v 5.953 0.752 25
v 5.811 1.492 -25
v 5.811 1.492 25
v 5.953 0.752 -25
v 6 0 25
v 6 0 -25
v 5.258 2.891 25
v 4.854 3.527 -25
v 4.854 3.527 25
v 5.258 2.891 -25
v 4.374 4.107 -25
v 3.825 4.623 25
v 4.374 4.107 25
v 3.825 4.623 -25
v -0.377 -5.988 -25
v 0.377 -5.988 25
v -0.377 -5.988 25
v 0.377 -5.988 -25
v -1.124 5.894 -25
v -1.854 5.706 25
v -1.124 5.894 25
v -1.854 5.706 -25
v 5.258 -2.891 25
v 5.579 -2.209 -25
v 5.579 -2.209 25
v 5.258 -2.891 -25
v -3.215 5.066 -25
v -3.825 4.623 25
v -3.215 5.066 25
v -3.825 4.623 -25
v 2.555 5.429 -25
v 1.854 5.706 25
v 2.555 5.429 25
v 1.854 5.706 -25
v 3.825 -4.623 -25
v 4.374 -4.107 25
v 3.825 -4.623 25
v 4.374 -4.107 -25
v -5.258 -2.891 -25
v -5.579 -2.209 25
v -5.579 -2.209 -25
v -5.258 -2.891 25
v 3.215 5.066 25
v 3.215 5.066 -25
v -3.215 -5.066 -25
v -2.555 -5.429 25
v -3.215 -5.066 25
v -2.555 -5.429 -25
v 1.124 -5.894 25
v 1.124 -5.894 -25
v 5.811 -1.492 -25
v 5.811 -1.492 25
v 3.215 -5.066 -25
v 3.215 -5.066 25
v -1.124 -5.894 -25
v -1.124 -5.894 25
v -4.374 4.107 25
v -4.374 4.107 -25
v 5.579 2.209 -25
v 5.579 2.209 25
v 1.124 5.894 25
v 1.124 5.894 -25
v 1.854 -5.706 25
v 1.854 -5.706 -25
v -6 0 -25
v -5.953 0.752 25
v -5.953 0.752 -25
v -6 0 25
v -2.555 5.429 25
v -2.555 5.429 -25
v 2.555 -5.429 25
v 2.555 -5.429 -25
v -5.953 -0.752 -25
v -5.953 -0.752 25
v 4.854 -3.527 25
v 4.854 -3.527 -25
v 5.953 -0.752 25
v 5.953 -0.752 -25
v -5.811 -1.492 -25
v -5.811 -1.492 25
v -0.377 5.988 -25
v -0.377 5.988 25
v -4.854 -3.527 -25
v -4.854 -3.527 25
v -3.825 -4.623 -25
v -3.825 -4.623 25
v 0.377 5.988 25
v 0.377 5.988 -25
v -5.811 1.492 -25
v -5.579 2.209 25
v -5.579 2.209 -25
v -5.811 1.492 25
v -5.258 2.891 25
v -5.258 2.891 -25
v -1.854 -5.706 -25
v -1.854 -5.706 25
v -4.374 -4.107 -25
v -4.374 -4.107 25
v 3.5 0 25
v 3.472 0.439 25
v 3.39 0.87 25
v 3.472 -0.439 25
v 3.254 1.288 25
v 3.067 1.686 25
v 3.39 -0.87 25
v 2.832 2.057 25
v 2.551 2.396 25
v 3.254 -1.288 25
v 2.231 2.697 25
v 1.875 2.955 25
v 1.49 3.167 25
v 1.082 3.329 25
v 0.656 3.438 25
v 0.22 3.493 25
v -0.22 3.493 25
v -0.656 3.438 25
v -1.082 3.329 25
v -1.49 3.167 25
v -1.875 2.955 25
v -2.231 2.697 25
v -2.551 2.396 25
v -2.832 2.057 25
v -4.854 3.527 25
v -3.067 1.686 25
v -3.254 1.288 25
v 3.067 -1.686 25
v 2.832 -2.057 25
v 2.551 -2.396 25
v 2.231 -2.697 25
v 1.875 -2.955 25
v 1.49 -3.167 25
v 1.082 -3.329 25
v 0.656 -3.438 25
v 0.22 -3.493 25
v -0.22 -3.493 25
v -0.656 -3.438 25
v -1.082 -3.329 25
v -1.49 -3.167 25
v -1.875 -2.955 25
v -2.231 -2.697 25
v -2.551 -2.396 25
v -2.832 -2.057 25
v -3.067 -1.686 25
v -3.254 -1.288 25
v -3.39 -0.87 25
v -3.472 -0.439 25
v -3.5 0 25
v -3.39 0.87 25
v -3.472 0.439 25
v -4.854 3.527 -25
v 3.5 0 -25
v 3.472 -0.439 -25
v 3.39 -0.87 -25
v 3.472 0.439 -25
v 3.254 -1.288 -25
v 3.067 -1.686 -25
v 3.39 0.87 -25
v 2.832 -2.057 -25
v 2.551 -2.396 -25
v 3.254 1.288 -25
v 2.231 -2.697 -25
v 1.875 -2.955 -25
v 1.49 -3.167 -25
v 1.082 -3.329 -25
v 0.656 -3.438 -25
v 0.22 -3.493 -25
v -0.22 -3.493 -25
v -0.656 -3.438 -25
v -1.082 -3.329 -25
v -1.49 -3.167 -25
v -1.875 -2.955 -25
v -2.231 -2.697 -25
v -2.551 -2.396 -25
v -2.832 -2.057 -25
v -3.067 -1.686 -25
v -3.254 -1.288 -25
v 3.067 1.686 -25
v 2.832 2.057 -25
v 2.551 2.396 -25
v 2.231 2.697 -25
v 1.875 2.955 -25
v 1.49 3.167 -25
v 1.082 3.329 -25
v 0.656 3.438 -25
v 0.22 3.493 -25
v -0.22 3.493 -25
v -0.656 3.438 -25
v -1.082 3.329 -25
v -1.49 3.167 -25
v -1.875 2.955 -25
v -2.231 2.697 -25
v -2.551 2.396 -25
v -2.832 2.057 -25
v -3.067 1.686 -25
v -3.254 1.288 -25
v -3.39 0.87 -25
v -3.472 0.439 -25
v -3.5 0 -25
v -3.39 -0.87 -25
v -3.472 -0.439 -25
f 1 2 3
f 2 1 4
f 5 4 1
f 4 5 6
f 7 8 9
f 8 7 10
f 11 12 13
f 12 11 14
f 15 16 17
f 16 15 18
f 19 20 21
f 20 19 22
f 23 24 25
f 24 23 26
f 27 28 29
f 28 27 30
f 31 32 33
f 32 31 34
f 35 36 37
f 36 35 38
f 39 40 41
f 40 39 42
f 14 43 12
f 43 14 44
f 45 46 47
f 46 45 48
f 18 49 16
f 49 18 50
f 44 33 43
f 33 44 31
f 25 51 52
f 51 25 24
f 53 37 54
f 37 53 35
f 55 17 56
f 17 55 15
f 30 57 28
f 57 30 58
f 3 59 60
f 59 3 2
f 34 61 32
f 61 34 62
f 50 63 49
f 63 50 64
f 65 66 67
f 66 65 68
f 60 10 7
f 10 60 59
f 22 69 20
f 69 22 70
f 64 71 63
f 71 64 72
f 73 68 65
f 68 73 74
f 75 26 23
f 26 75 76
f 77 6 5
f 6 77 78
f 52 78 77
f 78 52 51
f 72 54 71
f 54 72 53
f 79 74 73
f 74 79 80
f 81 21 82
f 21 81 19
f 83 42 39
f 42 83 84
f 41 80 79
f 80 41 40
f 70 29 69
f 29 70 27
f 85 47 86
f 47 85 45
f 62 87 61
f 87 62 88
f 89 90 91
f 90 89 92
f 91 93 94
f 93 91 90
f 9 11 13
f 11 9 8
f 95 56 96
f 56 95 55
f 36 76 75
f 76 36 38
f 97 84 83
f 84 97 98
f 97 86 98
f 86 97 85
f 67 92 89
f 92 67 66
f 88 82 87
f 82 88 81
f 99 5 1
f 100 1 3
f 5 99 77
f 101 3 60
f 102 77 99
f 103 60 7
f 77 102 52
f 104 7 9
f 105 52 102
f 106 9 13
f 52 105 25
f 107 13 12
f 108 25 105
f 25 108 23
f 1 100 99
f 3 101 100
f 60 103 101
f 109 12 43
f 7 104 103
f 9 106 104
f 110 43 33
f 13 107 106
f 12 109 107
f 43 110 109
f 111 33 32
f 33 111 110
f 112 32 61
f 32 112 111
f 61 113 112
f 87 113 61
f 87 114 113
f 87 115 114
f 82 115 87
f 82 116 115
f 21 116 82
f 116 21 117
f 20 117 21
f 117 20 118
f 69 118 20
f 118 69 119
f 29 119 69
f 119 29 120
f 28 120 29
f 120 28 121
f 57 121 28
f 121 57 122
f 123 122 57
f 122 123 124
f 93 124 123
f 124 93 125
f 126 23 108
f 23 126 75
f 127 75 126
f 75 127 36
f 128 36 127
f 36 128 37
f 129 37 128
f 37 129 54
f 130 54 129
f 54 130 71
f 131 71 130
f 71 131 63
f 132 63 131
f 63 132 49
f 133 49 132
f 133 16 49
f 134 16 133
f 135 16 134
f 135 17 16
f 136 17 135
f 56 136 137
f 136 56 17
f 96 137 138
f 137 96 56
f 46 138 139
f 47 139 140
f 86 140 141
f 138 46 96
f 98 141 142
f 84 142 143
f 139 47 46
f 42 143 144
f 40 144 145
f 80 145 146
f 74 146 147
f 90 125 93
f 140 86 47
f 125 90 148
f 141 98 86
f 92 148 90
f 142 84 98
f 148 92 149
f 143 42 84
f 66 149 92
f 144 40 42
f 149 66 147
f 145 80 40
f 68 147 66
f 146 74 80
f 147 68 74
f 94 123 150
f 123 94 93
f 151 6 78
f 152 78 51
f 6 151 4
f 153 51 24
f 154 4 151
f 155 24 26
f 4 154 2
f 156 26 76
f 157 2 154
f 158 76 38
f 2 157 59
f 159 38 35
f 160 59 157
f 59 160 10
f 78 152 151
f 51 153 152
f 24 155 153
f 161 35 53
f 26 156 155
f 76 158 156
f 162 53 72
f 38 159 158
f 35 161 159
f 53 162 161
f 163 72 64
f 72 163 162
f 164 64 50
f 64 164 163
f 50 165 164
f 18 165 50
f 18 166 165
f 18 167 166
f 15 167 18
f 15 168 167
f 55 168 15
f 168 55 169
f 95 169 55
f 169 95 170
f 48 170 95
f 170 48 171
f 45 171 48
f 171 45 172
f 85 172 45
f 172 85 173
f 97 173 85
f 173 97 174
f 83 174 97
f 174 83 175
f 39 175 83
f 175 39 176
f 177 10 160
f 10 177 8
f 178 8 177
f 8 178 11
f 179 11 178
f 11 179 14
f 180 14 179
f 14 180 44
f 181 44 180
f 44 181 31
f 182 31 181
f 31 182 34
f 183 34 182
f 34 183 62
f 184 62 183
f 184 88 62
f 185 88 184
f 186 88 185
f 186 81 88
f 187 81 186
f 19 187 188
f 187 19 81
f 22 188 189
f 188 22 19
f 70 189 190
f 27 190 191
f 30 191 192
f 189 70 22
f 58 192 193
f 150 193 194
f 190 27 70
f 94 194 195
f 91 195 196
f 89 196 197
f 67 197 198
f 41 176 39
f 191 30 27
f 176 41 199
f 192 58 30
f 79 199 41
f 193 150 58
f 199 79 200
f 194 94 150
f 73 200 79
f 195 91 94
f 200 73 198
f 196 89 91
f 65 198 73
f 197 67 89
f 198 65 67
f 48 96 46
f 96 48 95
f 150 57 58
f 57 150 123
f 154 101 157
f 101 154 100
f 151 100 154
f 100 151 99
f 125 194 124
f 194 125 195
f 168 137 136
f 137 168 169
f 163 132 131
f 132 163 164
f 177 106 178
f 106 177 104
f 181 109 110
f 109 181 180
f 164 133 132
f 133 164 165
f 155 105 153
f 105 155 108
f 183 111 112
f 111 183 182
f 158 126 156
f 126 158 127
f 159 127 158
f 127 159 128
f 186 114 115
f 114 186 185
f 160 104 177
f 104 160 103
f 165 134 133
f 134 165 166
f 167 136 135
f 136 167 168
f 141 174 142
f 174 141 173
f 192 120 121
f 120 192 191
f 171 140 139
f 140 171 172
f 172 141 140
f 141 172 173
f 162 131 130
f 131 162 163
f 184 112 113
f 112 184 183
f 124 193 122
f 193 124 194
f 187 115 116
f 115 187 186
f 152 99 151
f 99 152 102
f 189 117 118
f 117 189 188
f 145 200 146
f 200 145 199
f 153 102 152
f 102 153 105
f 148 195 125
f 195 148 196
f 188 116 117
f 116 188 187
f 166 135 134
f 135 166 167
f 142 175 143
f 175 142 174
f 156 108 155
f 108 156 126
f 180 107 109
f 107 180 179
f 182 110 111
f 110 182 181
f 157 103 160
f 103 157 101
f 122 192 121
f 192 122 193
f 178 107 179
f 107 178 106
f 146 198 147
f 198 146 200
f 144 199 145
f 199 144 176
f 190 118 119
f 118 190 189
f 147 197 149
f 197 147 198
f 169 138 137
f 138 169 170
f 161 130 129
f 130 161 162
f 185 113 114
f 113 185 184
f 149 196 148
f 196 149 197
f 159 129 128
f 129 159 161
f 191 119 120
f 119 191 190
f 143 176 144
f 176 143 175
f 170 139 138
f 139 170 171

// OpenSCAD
$fn = 50;


difference() {
	union() {
		translate(v = [0, 0, -25.0000000000]) {
			cylinder(h = 50, r = 6.0000000000);
		}
	}
	union() {
		translate(v = [0, 0, -100.0000000000]) {
			cylinder(h = 200, r = 3.5000000000);
		}
	}
}
